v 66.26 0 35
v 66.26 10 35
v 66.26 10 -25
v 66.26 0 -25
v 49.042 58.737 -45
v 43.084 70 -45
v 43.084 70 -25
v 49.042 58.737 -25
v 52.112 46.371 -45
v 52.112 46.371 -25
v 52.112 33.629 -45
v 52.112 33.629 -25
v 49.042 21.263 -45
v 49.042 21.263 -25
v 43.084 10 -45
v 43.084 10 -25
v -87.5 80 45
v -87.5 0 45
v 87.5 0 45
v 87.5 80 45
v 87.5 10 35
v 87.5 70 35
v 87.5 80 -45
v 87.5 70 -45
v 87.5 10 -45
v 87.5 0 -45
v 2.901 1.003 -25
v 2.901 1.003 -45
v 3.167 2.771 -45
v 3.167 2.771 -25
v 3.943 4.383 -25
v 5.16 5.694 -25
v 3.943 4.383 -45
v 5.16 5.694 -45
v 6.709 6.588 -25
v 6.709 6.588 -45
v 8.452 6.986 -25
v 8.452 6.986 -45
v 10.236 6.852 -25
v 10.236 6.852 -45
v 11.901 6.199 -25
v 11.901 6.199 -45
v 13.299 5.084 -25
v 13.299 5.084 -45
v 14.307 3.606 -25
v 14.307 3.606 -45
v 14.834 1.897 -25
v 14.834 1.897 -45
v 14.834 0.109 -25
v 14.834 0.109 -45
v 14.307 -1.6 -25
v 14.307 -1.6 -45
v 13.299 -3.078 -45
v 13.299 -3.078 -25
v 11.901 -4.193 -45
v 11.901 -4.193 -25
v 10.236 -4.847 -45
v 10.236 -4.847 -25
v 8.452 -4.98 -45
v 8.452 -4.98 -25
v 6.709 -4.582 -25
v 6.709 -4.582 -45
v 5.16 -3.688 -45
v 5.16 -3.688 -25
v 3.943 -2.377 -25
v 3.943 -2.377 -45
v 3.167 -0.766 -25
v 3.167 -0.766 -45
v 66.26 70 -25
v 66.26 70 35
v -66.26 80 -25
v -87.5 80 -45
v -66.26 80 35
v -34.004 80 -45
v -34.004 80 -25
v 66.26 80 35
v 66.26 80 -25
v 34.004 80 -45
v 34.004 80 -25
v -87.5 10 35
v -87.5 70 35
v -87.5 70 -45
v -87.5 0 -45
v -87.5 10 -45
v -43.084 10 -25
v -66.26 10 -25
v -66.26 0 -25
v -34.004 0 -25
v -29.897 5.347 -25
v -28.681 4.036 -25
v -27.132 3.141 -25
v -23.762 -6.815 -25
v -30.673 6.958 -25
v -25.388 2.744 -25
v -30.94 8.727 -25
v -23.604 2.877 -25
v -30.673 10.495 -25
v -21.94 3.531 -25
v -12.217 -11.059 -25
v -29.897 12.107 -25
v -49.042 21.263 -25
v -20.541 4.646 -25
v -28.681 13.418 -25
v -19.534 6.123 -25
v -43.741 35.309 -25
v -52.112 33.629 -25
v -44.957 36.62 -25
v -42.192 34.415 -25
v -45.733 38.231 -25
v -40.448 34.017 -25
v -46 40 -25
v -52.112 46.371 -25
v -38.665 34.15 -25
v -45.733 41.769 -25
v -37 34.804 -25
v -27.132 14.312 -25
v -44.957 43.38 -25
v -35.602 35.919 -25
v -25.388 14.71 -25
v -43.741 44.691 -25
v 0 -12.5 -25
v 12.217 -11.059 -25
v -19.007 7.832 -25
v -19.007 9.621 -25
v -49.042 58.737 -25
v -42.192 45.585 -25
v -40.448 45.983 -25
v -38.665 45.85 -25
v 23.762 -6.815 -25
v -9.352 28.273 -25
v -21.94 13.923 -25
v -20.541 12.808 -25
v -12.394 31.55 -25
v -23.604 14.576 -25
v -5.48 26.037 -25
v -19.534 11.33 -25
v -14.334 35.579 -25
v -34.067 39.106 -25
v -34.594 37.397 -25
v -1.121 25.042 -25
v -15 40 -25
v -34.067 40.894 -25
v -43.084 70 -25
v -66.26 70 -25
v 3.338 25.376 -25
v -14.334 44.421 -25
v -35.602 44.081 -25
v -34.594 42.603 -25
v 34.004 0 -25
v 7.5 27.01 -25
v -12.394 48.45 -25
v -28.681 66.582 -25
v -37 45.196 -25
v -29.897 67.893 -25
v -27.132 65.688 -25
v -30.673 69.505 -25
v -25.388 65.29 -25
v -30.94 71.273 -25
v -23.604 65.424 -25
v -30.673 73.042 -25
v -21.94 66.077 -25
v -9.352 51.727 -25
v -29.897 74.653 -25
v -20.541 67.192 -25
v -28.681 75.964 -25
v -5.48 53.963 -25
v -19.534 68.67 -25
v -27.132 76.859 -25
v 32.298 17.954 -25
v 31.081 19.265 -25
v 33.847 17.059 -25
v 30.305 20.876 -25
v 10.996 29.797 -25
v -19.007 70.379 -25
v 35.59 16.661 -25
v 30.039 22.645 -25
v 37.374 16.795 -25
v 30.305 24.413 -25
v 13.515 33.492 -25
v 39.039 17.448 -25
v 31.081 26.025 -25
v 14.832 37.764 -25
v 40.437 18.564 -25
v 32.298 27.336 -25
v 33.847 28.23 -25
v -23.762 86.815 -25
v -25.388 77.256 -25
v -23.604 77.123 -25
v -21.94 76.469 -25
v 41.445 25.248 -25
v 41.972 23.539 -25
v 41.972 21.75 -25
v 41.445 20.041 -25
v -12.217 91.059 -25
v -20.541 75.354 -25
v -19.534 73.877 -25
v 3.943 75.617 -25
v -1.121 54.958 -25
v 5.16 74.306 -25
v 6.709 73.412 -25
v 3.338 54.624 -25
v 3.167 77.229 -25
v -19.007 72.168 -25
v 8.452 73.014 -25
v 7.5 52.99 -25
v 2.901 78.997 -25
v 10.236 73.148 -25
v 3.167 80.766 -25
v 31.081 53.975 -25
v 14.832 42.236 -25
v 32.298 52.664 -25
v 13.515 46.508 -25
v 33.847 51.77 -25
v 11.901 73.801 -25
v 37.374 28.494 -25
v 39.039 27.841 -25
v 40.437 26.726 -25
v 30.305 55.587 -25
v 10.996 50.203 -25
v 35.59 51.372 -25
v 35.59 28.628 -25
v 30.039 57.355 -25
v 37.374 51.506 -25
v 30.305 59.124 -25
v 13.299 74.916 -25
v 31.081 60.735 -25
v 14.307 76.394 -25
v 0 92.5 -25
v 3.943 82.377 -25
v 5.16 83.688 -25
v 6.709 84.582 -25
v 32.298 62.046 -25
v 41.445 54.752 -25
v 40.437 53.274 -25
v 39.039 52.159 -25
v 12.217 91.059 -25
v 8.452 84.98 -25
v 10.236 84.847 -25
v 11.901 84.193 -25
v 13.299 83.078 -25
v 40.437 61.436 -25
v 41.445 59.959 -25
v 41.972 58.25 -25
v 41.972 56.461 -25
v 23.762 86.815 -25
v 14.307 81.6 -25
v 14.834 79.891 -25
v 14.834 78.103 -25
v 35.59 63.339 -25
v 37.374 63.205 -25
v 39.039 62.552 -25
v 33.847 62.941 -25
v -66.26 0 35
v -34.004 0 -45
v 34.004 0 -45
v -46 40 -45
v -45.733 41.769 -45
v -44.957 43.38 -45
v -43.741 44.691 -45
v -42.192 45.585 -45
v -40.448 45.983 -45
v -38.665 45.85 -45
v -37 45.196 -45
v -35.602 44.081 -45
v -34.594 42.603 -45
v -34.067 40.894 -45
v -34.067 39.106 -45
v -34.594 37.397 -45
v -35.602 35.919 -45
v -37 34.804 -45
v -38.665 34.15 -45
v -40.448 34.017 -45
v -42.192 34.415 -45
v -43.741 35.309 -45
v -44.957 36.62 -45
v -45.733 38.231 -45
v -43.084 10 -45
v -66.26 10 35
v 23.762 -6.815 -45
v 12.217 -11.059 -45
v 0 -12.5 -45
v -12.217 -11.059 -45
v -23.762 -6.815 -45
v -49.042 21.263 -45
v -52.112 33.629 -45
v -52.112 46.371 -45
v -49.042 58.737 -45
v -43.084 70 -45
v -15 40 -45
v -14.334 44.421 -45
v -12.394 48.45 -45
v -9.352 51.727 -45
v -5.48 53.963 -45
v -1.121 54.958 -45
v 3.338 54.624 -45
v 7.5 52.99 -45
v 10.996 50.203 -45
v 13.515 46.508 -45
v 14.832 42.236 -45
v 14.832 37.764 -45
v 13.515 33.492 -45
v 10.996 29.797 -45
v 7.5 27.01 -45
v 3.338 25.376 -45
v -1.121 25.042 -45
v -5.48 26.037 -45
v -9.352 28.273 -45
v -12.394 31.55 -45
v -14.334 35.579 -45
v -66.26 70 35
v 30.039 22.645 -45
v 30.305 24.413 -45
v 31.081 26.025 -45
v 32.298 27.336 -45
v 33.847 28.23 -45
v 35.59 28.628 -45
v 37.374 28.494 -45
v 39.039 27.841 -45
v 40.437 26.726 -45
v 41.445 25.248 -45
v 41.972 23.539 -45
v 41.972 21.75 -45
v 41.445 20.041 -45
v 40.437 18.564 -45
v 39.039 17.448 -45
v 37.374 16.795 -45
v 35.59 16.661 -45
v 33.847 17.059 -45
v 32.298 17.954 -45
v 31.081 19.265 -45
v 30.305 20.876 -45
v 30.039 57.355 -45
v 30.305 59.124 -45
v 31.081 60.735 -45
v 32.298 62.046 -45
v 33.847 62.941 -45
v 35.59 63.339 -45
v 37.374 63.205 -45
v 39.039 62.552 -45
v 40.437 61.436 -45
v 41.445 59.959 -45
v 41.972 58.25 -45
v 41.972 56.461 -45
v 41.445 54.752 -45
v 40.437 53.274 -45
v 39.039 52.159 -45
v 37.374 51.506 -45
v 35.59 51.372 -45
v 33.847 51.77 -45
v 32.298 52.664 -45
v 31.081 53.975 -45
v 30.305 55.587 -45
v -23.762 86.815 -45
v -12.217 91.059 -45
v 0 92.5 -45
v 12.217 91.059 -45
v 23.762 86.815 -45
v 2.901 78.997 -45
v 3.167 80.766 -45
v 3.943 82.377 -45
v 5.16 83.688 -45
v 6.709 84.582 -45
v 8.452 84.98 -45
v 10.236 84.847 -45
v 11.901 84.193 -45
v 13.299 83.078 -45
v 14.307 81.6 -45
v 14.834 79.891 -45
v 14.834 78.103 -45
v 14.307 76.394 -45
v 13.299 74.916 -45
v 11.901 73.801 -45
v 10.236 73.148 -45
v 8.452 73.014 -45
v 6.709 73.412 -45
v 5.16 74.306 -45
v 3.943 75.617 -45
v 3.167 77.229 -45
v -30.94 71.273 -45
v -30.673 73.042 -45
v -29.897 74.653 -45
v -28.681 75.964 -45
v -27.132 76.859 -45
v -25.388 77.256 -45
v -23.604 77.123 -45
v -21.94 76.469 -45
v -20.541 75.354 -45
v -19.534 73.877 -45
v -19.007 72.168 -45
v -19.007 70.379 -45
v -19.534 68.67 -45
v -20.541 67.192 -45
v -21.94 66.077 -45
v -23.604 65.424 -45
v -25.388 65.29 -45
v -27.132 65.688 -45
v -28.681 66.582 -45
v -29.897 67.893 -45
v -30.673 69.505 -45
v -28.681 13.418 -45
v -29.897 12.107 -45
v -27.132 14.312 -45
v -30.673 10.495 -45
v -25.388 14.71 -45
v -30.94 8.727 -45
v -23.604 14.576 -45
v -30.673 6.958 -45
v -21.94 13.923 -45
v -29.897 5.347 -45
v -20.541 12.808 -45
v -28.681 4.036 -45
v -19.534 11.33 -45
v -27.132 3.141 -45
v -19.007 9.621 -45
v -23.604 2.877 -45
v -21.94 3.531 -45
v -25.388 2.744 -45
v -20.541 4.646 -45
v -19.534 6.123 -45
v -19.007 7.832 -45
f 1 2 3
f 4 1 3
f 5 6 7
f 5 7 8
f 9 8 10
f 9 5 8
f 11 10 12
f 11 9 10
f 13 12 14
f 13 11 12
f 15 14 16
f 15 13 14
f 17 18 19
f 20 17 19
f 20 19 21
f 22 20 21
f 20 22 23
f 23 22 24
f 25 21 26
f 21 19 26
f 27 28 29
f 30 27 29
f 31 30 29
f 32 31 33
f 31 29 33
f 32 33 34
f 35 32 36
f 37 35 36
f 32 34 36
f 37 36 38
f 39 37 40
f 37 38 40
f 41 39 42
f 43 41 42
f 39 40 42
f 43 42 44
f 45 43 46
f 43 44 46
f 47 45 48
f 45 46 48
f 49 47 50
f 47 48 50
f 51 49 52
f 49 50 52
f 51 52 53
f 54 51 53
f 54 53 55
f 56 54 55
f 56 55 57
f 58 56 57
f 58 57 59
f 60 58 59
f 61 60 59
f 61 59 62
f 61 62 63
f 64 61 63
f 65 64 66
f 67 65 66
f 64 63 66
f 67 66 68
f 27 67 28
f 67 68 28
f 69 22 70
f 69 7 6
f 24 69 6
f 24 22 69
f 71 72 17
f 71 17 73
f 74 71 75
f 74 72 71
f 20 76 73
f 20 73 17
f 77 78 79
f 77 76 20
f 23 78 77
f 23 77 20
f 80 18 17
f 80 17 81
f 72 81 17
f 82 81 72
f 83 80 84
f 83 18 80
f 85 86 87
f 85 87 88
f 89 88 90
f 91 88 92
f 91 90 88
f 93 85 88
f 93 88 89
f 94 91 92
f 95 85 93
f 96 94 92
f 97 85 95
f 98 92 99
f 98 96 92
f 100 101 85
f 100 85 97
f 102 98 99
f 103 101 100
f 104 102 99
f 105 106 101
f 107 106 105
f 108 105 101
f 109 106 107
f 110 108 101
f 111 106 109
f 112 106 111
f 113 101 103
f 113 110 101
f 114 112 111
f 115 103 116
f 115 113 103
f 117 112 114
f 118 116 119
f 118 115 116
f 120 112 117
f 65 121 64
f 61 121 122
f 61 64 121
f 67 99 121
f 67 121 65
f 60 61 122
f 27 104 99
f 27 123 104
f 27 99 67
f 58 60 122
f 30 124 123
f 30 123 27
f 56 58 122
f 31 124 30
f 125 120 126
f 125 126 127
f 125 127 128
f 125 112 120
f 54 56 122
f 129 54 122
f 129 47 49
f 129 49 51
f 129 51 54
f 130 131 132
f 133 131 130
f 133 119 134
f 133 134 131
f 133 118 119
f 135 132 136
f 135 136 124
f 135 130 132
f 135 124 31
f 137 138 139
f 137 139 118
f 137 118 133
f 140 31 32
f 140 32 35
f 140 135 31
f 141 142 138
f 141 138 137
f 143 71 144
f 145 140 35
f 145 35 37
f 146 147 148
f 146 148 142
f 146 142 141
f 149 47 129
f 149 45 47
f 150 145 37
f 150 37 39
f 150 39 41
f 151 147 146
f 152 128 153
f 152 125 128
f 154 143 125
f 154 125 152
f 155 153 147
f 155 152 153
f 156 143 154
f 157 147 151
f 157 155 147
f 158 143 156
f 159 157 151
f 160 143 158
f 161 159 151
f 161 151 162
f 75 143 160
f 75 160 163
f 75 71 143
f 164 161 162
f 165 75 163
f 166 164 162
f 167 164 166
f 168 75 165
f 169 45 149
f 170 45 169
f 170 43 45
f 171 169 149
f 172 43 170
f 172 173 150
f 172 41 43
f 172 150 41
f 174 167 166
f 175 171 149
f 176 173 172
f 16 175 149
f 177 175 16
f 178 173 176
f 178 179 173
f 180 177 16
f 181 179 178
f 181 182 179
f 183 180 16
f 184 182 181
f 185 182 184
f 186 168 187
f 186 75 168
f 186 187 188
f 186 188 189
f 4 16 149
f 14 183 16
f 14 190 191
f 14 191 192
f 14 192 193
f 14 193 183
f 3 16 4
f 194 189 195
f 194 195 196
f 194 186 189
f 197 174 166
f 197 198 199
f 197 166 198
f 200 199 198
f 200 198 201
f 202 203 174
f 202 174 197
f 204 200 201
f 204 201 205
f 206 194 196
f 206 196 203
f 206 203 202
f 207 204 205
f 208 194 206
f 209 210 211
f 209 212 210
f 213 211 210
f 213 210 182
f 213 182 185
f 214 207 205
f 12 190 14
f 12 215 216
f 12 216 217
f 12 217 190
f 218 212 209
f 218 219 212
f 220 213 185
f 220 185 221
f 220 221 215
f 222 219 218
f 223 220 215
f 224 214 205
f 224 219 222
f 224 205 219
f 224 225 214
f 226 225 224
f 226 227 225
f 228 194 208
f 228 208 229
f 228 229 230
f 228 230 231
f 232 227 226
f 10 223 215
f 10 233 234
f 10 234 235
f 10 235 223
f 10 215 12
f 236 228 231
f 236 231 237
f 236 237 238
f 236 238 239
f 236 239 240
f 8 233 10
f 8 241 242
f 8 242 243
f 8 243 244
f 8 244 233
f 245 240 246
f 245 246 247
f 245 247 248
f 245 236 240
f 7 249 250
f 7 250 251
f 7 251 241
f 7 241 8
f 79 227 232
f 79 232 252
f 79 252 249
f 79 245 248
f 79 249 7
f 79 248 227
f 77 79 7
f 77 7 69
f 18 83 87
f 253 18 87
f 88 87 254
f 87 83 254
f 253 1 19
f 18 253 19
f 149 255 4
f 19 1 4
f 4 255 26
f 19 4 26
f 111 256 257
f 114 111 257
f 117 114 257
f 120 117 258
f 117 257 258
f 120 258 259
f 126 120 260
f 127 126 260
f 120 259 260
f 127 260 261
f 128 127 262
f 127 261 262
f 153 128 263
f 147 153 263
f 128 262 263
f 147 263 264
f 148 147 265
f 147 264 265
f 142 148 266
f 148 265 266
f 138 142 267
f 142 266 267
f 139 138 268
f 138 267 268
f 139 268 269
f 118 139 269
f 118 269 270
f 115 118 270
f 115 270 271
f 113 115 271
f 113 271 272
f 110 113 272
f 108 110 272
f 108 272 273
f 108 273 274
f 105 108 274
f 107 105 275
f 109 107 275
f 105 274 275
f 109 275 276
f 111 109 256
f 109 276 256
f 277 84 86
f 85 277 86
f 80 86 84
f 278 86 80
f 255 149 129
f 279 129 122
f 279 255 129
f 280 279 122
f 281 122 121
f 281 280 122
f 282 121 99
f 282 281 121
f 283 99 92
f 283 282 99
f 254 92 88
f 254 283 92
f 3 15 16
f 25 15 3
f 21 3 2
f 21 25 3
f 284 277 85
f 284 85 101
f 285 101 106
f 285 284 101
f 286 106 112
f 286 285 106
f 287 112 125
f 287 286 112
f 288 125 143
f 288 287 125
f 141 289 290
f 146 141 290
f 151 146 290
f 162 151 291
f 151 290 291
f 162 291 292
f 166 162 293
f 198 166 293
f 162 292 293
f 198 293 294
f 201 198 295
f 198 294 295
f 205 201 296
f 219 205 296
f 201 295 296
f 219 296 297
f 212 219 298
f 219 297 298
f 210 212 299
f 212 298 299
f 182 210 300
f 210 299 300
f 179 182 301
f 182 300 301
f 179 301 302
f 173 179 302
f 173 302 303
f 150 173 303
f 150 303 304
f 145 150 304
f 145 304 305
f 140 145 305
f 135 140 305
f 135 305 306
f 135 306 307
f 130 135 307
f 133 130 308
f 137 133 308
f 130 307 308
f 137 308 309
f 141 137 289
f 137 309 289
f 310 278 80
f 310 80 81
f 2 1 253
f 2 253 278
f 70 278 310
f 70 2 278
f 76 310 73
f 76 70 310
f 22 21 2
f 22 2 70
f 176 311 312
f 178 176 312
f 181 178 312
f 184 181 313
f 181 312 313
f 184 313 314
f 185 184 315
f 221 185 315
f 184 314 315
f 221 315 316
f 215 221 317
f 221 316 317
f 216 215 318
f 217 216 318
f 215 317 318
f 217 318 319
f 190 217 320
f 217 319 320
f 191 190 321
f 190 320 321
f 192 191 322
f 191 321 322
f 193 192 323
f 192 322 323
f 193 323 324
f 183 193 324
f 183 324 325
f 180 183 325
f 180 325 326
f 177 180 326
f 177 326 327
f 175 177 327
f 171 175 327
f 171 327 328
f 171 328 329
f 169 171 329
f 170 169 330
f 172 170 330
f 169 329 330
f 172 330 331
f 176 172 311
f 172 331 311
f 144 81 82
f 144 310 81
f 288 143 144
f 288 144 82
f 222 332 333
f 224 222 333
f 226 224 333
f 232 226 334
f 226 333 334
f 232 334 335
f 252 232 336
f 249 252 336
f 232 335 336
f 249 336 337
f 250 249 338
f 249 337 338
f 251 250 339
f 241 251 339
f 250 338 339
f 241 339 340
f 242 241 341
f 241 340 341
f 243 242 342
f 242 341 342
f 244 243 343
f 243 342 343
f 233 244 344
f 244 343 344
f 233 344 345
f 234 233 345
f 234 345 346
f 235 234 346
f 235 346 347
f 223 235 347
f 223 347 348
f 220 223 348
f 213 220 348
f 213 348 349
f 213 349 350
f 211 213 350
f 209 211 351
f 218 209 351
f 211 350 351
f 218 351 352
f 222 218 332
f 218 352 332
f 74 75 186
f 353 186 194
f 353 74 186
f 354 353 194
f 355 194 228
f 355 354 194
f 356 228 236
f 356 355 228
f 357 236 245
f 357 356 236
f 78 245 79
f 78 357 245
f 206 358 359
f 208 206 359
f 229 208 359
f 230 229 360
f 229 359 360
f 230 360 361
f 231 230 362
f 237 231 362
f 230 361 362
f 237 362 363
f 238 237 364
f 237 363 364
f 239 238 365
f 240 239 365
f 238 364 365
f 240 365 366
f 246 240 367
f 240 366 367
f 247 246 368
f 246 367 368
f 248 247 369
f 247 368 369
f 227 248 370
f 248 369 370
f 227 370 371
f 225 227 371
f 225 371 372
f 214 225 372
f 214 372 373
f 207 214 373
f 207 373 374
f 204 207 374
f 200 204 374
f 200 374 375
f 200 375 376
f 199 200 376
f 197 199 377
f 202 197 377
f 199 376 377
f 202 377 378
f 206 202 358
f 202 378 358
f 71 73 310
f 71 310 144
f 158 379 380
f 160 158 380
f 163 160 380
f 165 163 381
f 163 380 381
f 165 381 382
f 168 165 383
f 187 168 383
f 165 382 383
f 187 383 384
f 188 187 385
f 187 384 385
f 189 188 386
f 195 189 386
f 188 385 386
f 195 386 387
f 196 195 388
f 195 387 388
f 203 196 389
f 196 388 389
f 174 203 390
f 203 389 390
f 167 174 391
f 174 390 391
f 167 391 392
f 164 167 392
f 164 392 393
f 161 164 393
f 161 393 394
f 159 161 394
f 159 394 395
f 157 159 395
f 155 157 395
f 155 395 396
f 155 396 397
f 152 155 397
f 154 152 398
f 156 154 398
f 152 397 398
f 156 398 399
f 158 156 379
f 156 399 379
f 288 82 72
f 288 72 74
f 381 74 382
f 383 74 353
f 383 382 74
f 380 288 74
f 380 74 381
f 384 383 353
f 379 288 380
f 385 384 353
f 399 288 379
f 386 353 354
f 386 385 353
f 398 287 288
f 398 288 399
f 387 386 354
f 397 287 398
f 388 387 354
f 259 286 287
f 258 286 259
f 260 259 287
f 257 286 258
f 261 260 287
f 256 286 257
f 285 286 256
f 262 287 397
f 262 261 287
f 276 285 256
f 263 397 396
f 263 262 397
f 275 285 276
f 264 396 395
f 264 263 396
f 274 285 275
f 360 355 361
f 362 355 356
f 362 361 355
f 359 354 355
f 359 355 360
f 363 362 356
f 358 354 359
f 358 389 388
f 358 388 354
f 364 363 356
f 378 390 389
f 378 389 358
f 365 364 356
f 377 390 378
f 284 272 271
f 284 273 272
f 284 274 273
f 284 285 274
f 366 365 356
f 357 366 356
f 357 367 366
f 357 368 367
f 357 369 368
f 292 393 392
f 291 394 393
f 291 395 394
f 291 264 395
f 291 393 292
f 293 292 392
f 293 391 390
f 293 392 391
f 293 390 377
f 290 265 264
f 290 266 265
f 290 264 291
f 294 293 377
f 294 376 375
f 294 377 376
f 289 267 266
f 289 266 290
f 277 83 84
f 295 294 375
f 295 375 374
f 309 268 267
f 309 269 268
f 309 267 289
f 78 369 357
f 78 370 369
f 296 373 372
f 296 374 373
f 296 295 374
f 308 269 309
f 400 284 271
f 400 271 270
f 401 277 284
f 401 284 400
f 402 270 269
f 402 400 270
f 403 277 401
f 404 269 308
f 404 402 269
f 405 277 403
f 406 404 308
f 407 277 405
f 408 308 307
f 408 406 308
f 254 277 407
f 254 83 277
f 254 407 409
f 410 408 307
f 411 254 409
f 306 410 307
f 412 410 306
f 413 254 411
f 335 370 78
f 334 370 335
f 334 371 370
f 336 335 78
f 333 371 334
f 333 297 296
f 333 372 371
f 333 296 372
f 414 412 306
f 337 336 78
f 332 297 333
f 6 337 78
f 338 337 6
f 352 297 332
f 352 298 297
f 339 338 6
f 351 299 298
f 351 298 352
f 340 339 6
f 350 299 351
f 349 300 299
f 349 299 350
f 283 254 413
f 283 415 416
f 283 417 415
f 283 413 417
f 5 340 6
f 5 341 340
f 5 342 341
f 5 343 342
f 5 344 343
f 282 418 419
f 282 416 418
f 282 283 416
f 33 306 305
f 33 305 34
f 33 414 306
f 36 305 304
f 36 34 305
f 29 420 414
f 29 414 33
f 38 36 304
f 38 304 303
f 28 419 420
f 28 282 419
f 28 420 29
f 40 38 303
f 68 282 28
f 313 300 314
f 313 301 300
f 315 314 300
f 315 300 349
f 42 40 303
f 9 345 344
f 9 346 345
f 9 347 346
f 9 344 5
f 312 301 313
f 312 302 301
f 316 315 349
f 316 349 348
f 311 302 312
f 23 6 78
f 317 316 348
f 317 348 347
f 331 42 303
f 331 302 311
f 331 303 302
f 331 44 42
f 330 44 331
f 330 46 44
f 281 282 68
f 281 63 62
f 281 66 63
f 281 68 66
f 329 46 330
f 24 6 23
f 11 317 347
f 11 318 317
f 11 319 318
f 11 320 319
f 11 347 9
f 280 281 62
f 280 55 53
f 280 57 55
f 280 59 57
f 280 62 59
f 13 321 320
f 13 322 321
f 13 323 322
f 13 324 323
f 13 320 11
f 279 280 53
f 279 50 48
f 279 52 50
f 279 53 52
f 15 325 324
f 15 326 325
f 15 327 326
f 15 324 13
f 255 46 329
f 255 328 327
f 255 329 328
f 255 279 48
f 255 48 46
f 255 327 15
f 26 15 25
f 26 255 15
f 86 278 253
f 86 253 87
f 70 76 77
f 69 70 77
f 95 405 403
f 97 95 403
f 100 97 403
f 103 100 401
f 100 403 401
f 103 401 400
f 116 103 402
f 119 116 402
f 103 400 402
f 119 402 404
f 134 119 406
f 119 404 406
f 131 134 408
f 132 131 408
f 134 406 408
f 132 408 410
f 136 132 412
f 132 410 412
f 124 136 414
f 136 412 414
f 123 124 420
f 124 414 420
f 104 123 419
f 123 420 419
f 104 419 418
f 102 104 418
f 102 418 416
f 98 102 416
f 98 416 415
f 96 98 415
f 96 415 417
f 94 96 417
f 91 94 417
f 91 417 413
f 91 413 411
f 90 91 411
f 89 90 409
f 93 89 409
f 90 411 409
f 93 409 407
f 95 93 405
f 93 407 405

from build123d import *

# Parameters (mm, degrees)
SKETCH1_W               = 175
SKETCH1_H               = 90
BOSS_EXTRUDE1_DEPTH     = 80
CUT_EXTRUDE4_DEPTH      = 198.610728454
CUT_EXTRUDE4_DEPTH_BACK = 175
SKETCH5_W               = 132.519940576
SKETCH5_H               = 60
CUT_EXTRUDE5_DEPTH      = 175
BOSS_EXTRUDE2_DEPTH     = 20
SKETCH7_R               = 15
SKETCH7_R_2             = 6
CUT_EXTRUDE8_DEPTH      = 20


with BuildPart() as part:
    # Sketch1 → Boss-Extrude1 (new body)
    with BuildSketch(Plane(origin=(0, 0, 0), x_dir=(1, 0, 0), z_dir=(0, 1, 0))):
        Rectangle(SKETCH1_W, SKETCH1_H)
    extrude(amount=BOSS_EXTRUDE1_DEPTH)

    # Sketch4 → Cut-Extrude4 (cut, two sides: drawn at the far end of the back side and taken through both)
    with BuildSketch(Plane.ZY.offset(87.5).offset(-CUT_EXTRUDE4_DEPTH_BACK)):
        Polygon((35, 70), (-35, 70), (-45, 70), (-45, 10), (-35, 10), (35, 10), align=None)
    extrude(amount=CUT_EXTRUDE4_DEPTH + CUT_EXTRUDE4_DEPTH_BACK, mode=Mode.SUBTRACT)

    # Sketch5 → Cut-Extrude5 (cut)
    with BuildSketch(Plane(origin=(0, 80, 0), x_dir=(1, 0, 0), z_dir=(0, 1, 0))):
        with Locations((0, -5)):
            Rectangle(SKETCH5_W, SKETCH5_H)
    extrude(amount=-CUT_EXTRUDE5_DEPTH, mode=Mode.SUBTRACT)

    # Sketch6 → Boss-Extrude2 (add)
    with BuildSketch(Plane(origin=(0, 0, -45), x_dir=(-1, 0, 0), z_dir=(0, 0, -1))):
        with BuildLine():
            Line((-87.5, 0), (-34.003676272, 0))
            ThreePointArc((-34.003676272, 0), (0, -12.5), (34.003676272, 0))
            Line((34.003676272, 0), (87.5, 0))
            Line((87.5, 0), (87.5, 10))
            Line((87.5, 10), (43.084219849, 10))
            ThreePointArc((43.084219849, 10), (52.5, 40), (43.084219849, 70))
            Line((43.084219849, 70), (87.5, 70))
            Line((87.5, 70), (87.5, 80))
            Line((87.5, 80), (34.003676272, 80))
            ThreePointArc((34.003676272, 80), (0, 92.5), (-34.003676272, 80))
            Line((-34.003676272, 80), (-87.5, 80))
            Line((-87.5, 80), (-87.5, 70))
            Line((-87.5, 70), (-43.084219849, 70))
            ThreePointArc((-43.084219849, 70), (-52.5, 40), (-43.084219849, 10))
            Line((-43.084219849, 10), (-87.5, 10))
            Line((-87.5, 10), (-87.5, 0))
        make_face()
    extrude(amount=-BOSS_EXTRUDE2_DEPTH)

    # Sketch7 → Cut-Extrude8 (cut)
    with BuildSketch(Plane(origin=(0, 0, -45), x_dir=(-1, 0, 0), z_dir=(0, 0, -1))):
        with Locations((0, 40)):
            Circle(SKETCH7_R)
        with Locations((40, 40)):
            Circle(SKETCH7_R_2)
        with Locations((24.939592074, 8.726740701)):
            Circle(SKETCH7_R_2)
        with Locations((-8.900837358, 1.002883513)):
            Circle(SKETCH7_R_2)
        with Locations((-36.038754716, 22.644650435)):
            Circle(SKETCH7_R_2)
        with Locations((-36.038754716, 57.355349565)):
            Circle(SKETCH7_R_2)
        with Locations((-8.900837358, 78.997116487)):
            Circle(SKETCH7_R_2)
        with Locations((24.939592074, 71.273259299)):
            Circle(SKETCH7_R_2)
    extrude(amount=-CUT_EXTRUDE8_DEPTH, mode=Mode.SUBTRACT)


solid = part.part
